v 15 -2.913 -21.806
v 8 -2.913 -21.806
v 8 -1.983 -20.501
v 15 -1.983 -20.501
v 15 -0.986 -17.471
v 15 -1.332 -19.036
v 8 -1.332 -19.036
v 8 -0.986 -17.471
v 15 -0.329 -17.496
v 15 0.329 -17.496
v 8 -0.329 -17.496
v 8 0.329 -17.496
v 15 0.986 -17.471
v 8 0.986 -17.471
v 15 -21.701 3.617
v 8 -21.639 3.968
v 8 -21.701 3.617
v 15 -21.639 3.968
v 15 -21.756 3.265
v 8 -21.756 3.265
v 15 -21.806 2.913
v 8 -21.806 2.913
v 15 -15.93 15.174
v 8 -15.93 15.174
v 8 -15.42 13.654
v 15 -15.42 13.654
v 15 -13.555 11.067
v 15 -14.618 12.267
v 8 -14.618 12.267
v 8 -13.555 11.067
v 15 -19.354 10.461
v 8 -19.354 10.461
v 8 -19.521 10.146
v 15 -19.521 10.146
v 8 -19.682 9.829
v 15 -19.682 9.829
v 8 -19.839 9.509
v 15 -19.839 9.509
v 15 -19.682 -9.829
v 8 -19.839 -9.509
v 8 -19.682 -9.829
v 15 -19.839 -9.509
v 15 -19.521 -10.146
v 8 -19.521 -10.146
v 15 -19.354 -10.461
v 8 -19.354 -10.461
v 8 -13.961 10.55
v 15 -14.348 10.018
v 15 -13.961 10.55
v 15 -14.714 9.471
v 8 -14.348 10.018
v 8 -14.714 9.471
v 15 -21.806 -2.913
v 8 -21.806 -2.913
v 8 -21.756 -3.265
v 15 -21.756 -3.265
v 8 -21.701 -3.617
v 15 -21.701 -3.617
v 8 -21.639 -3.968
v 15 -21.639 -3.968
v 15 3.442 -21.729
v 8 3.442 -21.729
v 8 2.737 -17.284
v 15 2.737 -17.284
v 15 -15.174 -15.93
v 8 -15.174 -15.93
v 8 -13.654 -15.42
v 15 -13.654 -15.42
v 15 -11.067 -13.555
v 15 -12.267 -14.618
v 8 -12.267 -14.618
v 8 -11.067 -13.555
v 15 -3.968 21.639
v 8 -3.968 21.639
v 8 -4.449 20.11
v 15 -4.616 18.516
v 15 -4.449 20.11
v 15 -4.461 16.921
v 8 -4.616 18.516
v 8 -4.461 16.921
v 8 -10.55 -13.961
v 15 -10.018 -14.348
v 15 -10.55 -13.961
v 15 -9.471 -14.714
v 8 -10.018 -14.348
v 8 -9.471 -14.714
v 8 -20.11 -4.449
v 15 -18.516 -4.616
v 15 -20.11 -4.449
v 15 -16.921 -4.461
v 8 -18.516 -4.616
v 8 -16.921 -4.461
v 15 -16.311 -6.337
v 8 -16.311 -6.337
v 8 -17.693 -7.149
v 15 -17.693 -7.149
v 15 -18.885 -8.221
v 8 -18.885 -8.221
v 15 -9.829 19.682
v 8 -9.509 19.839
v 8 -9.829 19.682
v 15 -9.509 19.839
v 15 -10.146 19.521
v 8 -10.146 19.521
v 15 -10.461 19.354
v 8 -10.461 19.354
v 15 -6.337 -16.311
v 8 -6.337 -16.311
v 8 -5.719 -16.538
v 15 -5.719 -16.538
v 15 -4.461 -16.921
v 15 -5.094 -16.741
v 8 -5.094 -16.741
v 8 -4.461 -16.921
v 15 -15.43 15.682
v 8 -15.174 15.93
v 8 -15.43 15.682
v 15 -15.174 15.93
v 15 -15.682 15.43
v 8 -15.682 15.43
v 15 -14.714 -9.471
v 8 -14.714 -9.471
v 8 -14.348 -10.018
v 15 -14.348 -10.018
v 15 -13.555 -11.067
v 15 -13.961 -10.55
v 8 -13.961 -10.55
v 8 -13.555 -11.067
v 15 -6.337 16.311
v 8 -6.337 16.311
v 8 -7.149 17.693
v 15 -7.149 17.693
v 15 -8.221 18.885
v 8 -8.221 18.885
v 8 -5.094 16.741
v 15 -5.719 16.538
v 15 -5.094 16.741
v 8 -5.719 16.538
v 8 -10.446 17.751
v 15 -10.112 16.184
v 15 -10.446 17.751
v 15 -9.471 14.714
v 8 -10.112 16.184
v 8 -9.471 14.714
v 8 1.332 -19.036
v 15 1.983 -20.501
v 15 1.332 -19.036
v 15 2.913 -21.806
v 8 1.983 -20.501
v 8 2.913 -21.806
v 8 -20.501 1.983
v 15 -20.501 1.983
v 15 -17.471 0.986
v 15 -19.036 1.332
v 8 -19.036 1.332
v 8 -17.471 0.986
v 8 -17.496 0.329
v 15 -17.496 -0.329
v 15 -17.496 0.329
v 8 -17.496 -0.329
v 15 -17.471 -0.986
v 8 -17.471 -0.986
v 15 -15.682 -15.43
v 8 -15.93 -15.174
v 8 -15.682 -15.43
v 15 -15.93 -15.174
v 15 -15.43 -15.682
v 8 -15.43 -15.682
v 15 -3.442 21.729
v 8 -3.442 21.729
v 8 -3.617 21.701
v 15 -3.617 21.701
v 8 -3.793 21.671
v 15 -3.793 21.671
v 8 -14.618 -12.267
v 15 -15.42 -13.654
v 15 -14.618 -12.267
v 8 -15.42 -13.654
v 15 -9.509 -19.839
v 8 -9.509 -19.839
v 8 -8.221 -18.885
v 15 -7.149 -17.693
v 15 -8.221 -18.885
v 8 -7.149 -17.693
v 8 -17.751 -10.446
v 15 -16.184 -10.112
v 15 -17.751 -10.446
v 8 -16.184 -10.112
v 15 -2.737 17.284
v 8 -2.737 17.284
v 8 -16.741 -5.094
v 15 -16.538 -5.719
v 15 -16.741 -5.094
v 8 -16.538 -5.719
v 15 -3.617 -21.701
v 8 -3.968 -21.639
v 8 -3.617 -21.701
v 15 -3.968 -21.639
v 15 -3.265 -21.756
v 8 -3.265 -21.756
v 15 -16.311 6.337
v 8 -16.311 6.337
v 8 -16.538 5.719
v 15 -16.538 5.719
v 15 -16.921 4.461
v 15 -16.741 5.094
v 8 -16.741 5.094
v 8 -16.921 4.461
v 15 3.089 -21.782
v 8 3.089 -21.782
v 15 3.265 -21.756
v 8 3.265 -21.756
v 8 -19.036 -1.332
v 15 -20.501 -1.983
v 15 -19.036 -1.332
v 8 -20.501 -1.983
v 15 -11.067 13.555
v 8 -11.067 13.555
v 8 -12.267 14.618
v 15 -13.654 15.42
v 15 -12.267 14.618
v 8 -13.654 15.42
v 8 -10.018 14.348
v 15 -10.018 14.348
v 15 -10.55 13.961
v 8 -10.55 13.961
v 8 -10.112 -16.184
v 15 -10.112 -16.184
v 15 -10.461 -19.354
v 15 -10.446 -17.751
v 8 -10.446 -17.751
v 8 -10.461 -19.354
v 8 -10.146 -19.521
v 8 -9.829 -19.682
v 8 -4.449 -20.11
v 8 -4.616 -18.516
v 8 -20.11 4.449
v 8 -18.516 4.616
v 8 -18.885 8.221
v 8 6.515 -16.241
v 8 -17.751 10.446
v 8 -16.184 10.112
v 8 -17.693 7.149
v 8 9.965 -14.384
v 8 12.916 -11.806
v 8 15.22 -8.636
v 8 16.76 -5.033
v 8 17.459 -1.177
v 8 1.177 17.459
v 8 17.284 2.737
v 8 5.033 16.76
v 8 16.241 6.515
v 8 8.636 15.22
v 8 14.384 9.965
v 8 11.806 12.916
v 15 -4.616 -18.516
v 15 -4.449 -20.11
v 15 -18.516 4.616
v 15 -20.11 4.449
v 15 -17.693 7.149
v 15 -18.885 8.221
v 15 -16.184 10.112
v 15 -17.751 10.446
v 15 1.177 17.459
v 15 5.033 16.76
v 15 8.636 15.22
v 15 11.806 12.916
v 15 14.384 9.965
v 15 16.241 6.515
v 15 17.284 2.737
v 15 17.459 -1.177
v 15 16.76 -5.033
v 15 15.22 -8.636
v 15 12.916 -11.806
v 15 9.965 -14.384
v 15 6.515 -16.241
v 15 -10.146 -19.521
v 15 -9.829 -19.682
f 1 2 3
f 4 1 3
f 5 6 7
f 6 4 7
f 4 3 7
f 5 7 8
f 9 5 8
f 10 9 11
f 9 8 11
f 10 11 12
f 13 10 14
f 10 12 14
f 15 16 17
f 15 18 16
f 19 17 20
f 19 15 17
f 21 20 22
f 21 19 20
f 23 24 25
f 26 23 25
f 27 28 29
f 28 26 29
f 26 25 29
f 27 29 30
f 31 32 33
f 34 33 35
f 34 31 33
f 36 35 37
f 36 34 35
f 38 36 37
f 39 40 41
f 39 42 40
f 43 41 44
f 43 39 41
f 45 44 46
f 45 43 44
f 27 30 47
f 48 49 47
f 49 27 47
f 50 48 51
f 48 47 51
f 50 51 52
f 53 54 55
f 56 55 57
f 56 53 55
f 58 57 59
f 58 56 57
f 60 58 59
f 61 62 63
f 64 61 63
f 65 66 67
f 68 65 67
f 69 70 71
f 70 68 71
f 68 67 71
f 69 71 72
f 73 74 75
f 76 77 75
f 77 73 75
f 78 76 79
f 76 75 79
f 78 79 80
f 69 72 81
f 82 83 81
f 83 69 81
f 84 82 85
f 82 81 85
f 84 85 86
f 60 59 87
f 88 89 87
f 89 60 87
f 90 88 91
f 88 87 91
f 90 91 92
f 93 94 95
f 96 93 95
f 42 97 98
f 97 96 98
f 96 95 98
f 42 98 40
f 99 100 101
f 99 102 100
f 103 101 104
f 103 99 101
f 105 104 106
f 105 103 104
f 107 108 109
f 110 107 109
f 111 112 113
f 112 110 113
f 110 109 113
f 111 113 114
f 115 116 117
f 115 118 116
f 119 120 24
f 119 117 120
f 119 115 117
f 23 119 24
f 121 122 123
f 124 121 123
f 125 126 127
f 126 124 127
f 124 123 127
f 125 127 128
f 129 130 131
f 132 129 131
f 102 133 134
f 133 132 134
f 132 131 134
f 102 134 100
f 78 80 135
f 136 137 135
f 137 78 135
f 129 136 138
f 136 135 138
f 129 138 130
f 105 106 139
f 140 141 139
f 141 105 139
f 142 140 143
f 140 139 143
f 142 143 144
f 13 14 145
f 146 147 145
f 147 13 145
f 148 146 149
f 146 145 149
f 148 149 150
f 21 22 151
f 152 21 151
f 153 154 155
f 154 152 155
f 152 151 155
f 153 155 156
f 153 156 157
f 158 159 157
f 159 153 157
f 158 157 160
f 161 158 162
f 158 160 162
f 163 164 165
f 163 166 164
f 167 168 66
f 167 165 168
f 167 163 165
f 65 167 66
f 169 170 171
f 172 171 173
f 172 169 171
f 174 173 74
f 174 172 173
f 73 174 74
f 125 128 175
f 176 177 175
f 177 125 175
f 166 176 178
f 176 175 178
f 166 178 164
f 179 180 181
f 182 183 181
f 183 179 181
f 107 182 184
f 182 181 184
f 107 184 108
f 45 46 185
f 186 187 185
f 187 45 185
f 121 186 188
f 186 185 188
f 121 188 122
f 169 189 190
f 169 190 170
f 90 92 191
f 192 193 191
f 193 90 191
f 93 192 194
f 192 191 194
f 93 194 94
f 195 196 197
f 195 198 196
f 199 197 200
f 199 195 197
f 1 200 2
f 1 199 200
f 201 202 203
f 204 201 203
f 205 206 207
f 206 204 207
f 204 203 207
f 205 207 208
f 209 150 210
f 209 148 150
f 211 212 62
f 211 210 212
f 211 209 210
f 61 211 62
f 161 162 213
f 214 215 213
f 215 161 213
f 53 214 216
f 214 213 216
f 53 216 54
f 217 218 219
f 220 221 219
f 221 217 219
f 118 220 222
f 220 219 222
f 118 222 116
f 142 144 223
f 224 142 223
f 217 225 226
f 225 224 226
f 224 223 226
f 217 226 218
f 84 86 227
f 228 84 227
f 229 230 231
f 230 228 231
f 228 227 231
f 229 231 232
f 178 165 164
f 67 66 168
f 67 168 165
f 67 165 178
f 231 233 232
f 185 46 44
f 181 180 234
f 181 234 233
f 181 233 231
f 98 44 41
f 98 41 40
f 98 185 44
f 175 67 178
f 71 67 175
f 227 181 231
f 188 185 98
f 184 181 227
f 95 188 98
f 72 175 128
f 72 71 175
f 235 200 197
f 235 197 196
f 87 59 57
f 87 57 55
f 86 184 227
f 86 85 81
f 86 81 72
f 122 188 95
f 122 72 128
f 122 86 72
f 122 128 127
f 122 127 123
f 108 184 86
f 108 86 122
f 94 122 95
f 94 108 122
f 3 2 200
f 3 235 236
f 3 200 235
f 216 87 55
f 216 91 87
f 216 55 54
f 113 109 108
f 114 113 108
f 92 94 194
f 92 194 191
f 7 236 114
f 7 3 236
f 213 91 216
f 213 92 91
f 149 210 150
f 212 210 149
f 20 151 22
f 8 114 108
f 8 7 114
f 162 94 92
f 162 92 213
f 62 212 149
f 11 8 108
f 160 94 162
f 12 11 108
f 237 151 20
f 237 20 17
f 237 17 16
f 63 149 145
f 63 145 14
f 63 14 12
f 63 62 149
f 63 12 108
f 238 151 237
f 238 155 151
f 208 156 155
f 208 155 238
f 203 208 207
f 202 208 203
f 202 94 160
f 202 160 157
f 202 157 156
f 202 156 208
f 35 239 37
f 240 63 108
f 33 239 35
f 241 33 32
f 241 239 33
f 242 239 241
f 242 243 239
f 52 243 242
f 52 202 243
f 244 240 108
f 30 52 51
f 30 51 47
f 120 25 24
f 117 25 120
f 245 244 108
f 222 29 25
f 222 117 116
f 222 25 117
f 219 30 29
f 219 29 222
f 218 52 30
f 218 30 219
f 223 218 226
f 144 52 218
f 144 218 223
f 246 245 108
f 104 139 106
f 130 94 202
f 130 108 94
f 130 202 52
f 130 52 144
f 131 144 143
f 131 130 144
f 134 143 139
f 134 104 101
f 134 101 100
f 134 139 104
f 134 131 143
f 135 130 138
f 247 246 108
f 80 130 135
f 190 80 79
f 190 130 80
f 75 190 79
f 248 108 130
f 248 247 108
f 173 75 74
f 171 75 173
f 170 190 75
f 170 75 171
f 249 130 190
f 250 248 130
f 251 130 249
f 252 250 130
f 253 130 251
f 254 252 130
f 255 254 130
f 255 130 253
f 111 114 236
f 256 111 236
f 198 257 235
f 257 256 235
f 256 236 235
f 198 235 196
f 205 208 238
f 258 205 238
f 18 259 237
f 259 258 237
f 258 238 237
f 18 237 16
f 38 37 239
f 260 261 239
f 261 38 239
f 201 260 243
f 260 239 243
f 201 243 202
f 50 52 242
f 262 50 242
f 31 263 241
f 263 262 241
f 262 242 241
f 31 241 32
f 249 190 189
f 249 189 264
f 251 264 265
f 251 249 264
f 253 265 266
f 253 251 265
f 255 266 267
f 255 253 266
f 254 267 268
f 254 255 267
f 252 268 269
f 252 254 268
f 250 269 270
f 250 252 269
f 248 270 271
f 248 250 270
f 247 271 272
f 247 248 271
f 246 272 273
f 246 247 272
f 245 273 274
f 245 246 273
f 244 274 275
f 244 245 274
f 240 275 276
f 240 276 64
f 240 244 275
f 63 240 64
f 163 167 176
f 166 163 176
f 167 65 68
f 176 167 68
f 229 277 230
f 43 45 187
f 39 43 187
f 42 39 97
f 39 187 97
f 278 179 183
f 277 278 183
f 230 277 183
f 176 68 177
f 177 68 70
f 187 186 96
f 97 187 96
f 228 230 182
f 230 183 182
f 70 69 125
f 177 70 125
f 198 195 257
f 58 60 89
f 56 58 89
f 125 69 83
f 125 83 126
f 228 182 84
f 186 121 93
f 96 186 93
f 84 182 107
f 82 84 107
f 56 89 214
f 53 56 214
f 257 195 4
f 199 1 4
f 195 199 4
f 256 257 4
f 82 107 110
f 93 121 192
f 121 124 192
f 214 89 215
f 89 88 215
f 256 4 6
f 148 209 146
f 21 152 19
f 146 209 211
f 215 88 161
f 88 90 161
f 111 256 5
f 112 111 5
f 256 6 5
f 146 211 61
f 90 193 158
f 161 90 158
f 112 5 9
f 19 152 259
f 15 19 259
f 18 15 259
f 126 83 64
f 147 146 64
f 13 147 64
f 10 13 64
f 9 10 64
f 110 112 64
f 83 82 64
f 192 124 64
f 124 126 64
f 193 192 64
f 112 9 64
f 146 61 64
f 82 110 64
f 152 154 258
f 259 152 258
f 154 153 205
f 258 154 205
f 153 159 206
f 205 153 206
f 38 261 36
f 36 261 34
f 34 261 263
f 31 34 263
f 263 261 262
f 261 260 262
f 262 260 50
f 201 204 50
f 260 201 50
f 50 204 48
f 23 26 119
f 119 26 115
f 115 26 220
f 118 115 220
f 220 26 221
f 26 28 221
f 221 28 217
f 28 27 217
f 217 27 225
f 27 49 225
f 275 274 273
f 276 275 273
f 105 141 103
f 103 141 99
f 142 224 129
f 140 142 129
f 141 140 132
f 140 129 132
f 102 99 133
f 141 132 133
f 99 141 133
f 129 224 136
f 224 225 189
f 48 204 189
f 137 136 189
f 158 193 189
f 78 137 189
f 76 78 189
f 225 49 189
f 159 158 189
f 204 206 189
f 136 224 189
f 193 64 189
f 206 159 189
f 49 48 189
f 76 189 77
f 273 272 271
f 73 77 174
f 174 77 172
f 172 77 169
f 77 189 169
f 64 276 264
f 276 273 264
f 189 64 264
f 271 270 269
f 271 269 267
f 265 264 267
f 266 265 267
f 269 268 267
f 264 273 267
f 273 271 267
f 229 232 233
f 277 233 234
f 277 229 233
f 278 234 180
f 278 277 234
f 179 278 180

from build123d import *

# Parameters (mm, degrees)
BASPROSKE_W         = 15
BASPROSKE_H         = 22
TOOTHCUT_DEPTH      = 35.539832078
TEETHCUTS_COUNT     = 20
TEETHCUTS_ANGLE     = 342
BORSKE_R            = 0.5
BORE_DEPTH          = 50.0000508
SKETCH1_R           = 11.1
CUT_EXTRUDE1_DEPTH  = 16
CUT_EXTRUDE2_DEPTH  = 8
SKETCH3_R           = 11.1
BOSS_EXTRUDE1_DEPTH = 7
CUT_EXTRUDE3_DEPTH  = 7
SKETCH5_R           = 17.499
BOSS_EXTRUDE2_DEPTH = 7


with BuildPart() as part:
    # BasProSke → Base-Revolve (revolve)
    with BuildSketch(Plane(origin=(0, 0, 0), x_dir=(1, 0, 0), z_dir=(0, 1, 0)), mode=Mode.PRIVATE) as base_revolve_sk:
        with Locations((7.5, 11)):
            Rectangle(BASPROSKE_W, BASPROSKE_H)
    revolve(base_revolve_sk.sketch.rotate(Axis((-10, 0, 0), (1, 0, 0)), 180), axis=Axis((-10, 0, 0), (1, 0, 0)))

    # TooCutSke → ToothCut (cut, through all)
    with BuildSketch(Plane(origin=(0, 0, 0), x_dir=(0, 0, -1), z_dir=(1, 0, 0))):
        with BuildLine():
            ThreePointArc((0.986171591, 17.471189616), (0, 17.499), (-0.986171591, 17.471189616))
            ThreePointArc((-0.986171591, 17.471189616), (-1.626916196, 19.798789858), (-2.932850173, 21.829260982))
            ThreePointArc((-2.932850173, 21.829260982), (0, 22.0254), (2.932850173, 21.829260982))
            ThreePointArc((2.932850173, 21.829260982), (1.626916196, 19.798789858), (0.986171591, 17.471189616))
        make_face()
    toothcut = extrude(amount=TOOTHCUT_DEPTH, mode=Mode.SUBTRACT)

    # TeethCuts: ToothCut ×20 about axis
    teethcuts_axis = Axis((-10, 0, 0), (1, 0, 0))
    for i in range(1, TEETHCUTS_COUNT):
        add(toothcut.rotate(teethcuts_axis, i * TEETHCUTS_ANGLE / (TEETHCUTS_COUNT - 1)), mode=Mode.SUBTRACT)

    # BorSke → Bore (cut, symmetric)
    with BuildSketch(Plane(origin=(0, 0, 0), x_dir=(0, 0, -1), z_dir=(1, 0, 0))):
        with Locations(Location((0, 0, 0), (0, 0, 180))):
            Circle(BORSKE_R)
    extrude(amount=BORE_DEPTH, both=True, mode=Mode.SUBTRACT)

    # Sketch1 → Cut-Extrude1 (cut)
    with BuildSketch(Plane.ZY):
        Circle(SKETCH1_R)
    extrude(amount=-CUT_EXTRUDE1_DEPTH, mode=Mode.SUBTRACT)

    # Sketch2 → Cut-Extrude2 (cut)
    with BuildSketch(Plane.ZY):
        with BuildLine():
            ThreePointArc((17.471189616, 0.986171591), (19.784848102, 1.620704589), (21.806333941, 2.912696354))
            ThreePointArc((21.806333941, 2.912696354), (21.729143493, 3.441558231), (21.639128664, 3.968388926))
            ThreePointArc((21.639128664, 3.968388926), (19.317333972, 4.572472634), (16.920832513, 4.460989585))
            ThreePointArc((16.920832513, 4.460989585), (16.642537979, 5.407488385), (16.31134495, 6.336799421))
            ThreePointArc((16.31134495, 6.336799421), (18.31568345, 7.655235955), (19.838983319, 9.50866662))
            ThreePointArc((19.838983319, 9.50866662), (19.602143532, 9.987790994), (19.353734704, 10.461020648))
            ThreePointArc((19.353734704, 10.461020648), (16.958904602, 10.318064378), (14.714146429, 9.471478019))
            ThreePointArc((14.714146429, 9.471478019), (14.156988385, 10.28565413), (13.554832194, 11.067137173))
            ThreePointArc((13.554832194, 11.067137173), (15.05365209, 12.940419489), (15.929654782, 15.173862347))
            ThreePointArc((15.929654782, 15.173862347), (15.556349186, 15.556349186), (15.173862347, 15.929654782))
            ThreePointArc((15.173862347, 15.929654782), (12.940419489, 15.05365209), (11.067137173, 13.554832194))
            ThreePointArc((11.067137173, 13.554832194), (10.28565413, 14.156988385), (9.471478019, 14.714146429))
            ThreePointArc((9.471478019, 14.714146429), (10.318064378, 16.958904602), (10.461020648, 19.353734704))
            ThreePointArc((10.461020648, 19.353734704), (9.987790994, 19.602143532), (9.50866662, 19.838983319))
            ThreePointArc((9.50866662, 19.838983319), (7.655235955, 18.31568345), (6.336799421, 16.31134495))
            ThreePointArc((6.336799421, 16.31134495), (5.407488385, 16.642537979), (4.460989585, 16.920832513))
            ThreePointArc((4.460989585, 16.920832513), (4.572472634, 19.317333972), (3.968388926, 21.639128664))
            ThreePointArc((3.968388926, 21.639128664), (3.441558231, 21.729143493), (2.912696354, 21.806333941))
            ThreePointArc((2.912696354, 21.806333941), (1.620704589, 19.784848102), (0.986171591, 17.471189616))
            ThreePointArc((0.986171591, 17.471189616), (0, 17.499), (-0.986171591, 17.471189616))
            ThreePointArc((-0.986171591, 17.471189616), (-1.620704589, 19.784848102), (-2.912696354, 21.806333941))
            ThreePointArc((-2.912696354, 21.806333941), (-3.441558231, 21.729143493), (-3.968388926, 21.639128664))
            ThreePointArc((-3.968388926, 21.639128664), (-4.572472634, 19.317333972), (-4.460989585, 16.920832513))
            ThreePointArc((-4.460989585, 16.920832513), (-5.407488385, 16.642537979), (-6.336799421, 16.31134495))
            ThreePointArc((-6.336799421, 16.31134495), (-7.655235955, 18.31568345), (-9.50866662, 19.838983319))
            ThreePointArc((-9.50866662, 19.838983319), (-9.987790994, 19.602143532), (-10.461020648, 19.353734704))
            ThreePointArc((-10.461020648, 19.353734704), (-10.318064378, 16.958904602), (-9.471478019, 14.714146429))
            ThreePointArc((-9.471478019, 14.714146429), (-10.28565413, 14.156988385), (-11.067137173, 13.554832194))
            ThreePointArc((-11.067137173, 13.554832194), (-12.940419489, 15.05365209), (-15.173862347, 15.929654782))
            ThreePointArc((-15.173862347, 15.929654782), (-15.556349186, 15.556349186), (-15.929654782, 15.173862347))
            ThreePointArc((-15.929654782, 15.173862347), (-15.05365209, 12.940419489), (-13.554832194, 11.067137173))
            ThreePointArc((-13.554832194, 11.067137173), (-14.156988385, 10.28565413), (-14.714146429, 9.471478019))
            ThreePointArc((-14.714146429, 9.471478019), (-16.958904602, 10.318064378), (-19.353734704, 10.461020648))
            ThreePointArc((-19.353734704, 10.461020648), (-19.602143532, 9.987790994), (-19.838983319, 9.50866662))
            ThreePointArc((-19.838983319, 9.50866662), (-18.31568345, 7.655235955), (-16.31134495, 6.336799421))
            ThreePointArc((-16.31134495, 6.336799421), (-16.642537979, 5.407488385), (-16.920832513, 4.460989585))
            ThreePointArc((-16.920832513, 4.460989585), (-19.317333972, 4.572472634), (-21.639128664, 3.968388926))
            ThreePointArc((-21.639128664, 3.968388926), (-21.729143493, 3.441558231), (-21.806333941, 2.912696354))
            ThreePointArc((-21.806333941, 2.912696354), (-19.784848102, 1.620704589), (-17.471189616, 0.986171591))
            ThreePointArc((-17.471189616, 0.986171591), (-17.499, 0), (-17.471189616, -0.986171591))
            ThreePointArc((-17.471189616, -0.986171591), (-19.784848102, -1.620704589), (-21.806333941, -2.912696354))
            ThreePointArc((-21.806333941, -2.912696354), (-21.729143493, -3.441558231), (-21.639128664, -3.968388926))
            ThreePointArc((-21.639128664, -3.968388926), (-19.317333972, -4.572472634), (-16.920832513, -4.460989585))
            ThreePointArc((-16.920832513, -4.460989585), (-16.642537979, -5.407488385), (-16.31134495, -6.336799421))
            ThreePointArc((-16.31134495, -6.336799421), (-18.31568345, -7.655235955), (-19.838983319, -9.50866662))
            ThreePointArc((-19.838983319, -9.50866662), (-19.602143532, -9.987790994), (-19.353734704, -10.461020648))
            ThreePointArc((-19.353734704, -10.461020648), (-16.958904602, -10.318064378), (-14.714146429, -9.471478019))
            ThreePointArc((-14.714146429, -9.471478019), (-14.156988385, -10.28565413), (-13.554832194, -11.067137173))
            ThreePointArc((-13.554832194, -11.067137173), (-15.05365209, -12.940419489), (-15.929654782, -15.173862347))
            ThreePointArc((-15.929654782, -15.173862347), (-15.556349186, -15.556349186), (-15.173862347, -15.929654782))
            ThreePointArc((-15.173862347, -15.929654782), (-12.940419489, -15.05365209), (-11.067137173, -13.554832194))
            ThreePointArc((-11.067137173, -13.554832194), (-10.28565413, -14.156988385), (-9.471478019, -14.714146429))
            ThreePointArc((-9.471478019, -14.714146429), (-10.318064378, -16.958904602), (-10.461020648, -19.353734704))
            ThreePointArc((-10.461020648, -19.353734704), (-9.987790994, -19.602143532), (-9.50866662, -19.838983319))
            ThreePointArc((-9.50866662, -19.838983319), (-7.655235955, -18.31568345), (-6.336799421, -16.31134495))
            ThreePointArc((-6.336799421, -16.31134495), (-5.407488385, -16.642537979), (-4.460989585, -16.920832513))
            ThreePointArc((-4.460989585, -16.920832513), (-4.572472634, -19.317333972), (-3.968388926, -21.639128664))
            ThreePointArc((-3.968388926, -21.639128664), (-3.441558231, -21.729143493), (-2.912696354, -21.806333941))
            ThreePointArc((-2.912696354, -21.806333941), (-1.620704589, -19.784848102), (-0.986171591, -17.471189616))
            ThreePointArc((-0.986171591, -17.471189616), (0, -17.499), (0.986171591, -17.471189616))
            ThreePointArc((0.986171591, -17.471189616), (1.620704589, -19.784848102), (2.912696354, -21.806333941))
            ThreePointArc((2.912696354, -21.806333941), (3.441558231, -21.729143493), (3.968388926, -21.639128664))
            ThreePointArc((3.968388926, -21.639128664), (4.572472634, -19.317333972), (4.460989585, -16.920832513))
            ThreePointArc((4.460989585, -16.920832513), (5.407488385, -16.642537979), (6.336799421, -16.31134495))
            ThreePointArc((6.336799421, -16.31134495), (7.655235955, -18.31568345), (9.50866662, -19.838983319))
            ThreePointArc((9.50866662, -19.838983319), (9.987790994, -19.602143532), (10.461020648, -19.353734704))
            ThreePointArc((10.461020648, -19.353734704), (10.318064378, -16.958904602), (9.471478019, -14.714146429))
            ThreePointArc((9.471478019, -14.714146429), (10.28565413, -14.156988385), (11.067137173, -13.554832194))
            ThreePointArc((11.067137173, -13.554832194), (12.940419489, -15.05365209), (15.173862347, -15.929654782))
            ThreePointArc((15.173862347, -15.929654782), (15.556349186, -15.556349186), (15.929654782, -15.173862347))
            ThreePointArc((15.929654782, -15.173862347), (15.05365209, -12.940419489), (13.554832194, -11.067137173))
            ThreePointArc((13.554832194, -11.067137173), (14.156988385, -10.28565413), (14.714146429, -9.471478019))
            ThreePointArc((14.714146429, -9.471478019), (16.958904602, -10.318064378), (19.353734704, -10.461020648))
            ThreePointArc((19.353734704, -10.461020648), (19.602143532, -9.987790994), (19.838983319, -9.50866662))
            ThreePointArc((19.838983319, -9.50866662), (18.31568345, -7.655235955), (16.31134495, -6.336799421))
            ThreePointArc((16.31134495, -6.336799421), (16.642537979, -5.407488385), (16.920832513, -4.460989585))
            ThreePointArc((16.920832513, -4.460989585), (19.317333972, -4.572472634), (21.639128664, -3.968388926))
            ThreePointArc((21.639128664, -3.968388926), (21.729143493, -3.441558231), (21.806333941, -2.912696354))
            ThreePointArc((21.806333941, -2.912696354), (19.784848102, -1.620704589), (17.471189616, -0.986171591))
            ThreePointArc((17.471189616, -0.986171591), (17.499, 0), (17.471189616, 0.986171591))
        make_face()
    extrude(amount=-CUT_EXTRUDE2_DEPTH, mode=Mode.SUBTRACT)

    # Sketch3 → Boss-Extrude1 (add)
    with BuildSketch(Plane.ZY.offset(-8)):
        Circle(SKETCH3_R)
    extrude(amount=-BOSS_EXTRUDE1_DEPTH)

    # Sketch4 → Cut-Extrude3 (cut)
    with BuildSketch(Plane.ZY.offset(-8)):
        Polygon((21.729143493, -3.441558231), (0, 0), (-21.729143493, 3.441558231), (-17.979863548, 27.113580164), (25.478423438, 20.230463702), align=None)
    extrude(amount=-CUT_EXTRUDE3_DEPTH, mode=Mode.SUBTRACT)

    # Sketch5 → Boss-Extrude2 (add)
    with BuildSketch(Plane.ZY.offset(-8)):
        Circle(SKETCH5_R)
    extrude(amount=-BOSS_EXTRUDE2_DEPTH)


solid = part.part
